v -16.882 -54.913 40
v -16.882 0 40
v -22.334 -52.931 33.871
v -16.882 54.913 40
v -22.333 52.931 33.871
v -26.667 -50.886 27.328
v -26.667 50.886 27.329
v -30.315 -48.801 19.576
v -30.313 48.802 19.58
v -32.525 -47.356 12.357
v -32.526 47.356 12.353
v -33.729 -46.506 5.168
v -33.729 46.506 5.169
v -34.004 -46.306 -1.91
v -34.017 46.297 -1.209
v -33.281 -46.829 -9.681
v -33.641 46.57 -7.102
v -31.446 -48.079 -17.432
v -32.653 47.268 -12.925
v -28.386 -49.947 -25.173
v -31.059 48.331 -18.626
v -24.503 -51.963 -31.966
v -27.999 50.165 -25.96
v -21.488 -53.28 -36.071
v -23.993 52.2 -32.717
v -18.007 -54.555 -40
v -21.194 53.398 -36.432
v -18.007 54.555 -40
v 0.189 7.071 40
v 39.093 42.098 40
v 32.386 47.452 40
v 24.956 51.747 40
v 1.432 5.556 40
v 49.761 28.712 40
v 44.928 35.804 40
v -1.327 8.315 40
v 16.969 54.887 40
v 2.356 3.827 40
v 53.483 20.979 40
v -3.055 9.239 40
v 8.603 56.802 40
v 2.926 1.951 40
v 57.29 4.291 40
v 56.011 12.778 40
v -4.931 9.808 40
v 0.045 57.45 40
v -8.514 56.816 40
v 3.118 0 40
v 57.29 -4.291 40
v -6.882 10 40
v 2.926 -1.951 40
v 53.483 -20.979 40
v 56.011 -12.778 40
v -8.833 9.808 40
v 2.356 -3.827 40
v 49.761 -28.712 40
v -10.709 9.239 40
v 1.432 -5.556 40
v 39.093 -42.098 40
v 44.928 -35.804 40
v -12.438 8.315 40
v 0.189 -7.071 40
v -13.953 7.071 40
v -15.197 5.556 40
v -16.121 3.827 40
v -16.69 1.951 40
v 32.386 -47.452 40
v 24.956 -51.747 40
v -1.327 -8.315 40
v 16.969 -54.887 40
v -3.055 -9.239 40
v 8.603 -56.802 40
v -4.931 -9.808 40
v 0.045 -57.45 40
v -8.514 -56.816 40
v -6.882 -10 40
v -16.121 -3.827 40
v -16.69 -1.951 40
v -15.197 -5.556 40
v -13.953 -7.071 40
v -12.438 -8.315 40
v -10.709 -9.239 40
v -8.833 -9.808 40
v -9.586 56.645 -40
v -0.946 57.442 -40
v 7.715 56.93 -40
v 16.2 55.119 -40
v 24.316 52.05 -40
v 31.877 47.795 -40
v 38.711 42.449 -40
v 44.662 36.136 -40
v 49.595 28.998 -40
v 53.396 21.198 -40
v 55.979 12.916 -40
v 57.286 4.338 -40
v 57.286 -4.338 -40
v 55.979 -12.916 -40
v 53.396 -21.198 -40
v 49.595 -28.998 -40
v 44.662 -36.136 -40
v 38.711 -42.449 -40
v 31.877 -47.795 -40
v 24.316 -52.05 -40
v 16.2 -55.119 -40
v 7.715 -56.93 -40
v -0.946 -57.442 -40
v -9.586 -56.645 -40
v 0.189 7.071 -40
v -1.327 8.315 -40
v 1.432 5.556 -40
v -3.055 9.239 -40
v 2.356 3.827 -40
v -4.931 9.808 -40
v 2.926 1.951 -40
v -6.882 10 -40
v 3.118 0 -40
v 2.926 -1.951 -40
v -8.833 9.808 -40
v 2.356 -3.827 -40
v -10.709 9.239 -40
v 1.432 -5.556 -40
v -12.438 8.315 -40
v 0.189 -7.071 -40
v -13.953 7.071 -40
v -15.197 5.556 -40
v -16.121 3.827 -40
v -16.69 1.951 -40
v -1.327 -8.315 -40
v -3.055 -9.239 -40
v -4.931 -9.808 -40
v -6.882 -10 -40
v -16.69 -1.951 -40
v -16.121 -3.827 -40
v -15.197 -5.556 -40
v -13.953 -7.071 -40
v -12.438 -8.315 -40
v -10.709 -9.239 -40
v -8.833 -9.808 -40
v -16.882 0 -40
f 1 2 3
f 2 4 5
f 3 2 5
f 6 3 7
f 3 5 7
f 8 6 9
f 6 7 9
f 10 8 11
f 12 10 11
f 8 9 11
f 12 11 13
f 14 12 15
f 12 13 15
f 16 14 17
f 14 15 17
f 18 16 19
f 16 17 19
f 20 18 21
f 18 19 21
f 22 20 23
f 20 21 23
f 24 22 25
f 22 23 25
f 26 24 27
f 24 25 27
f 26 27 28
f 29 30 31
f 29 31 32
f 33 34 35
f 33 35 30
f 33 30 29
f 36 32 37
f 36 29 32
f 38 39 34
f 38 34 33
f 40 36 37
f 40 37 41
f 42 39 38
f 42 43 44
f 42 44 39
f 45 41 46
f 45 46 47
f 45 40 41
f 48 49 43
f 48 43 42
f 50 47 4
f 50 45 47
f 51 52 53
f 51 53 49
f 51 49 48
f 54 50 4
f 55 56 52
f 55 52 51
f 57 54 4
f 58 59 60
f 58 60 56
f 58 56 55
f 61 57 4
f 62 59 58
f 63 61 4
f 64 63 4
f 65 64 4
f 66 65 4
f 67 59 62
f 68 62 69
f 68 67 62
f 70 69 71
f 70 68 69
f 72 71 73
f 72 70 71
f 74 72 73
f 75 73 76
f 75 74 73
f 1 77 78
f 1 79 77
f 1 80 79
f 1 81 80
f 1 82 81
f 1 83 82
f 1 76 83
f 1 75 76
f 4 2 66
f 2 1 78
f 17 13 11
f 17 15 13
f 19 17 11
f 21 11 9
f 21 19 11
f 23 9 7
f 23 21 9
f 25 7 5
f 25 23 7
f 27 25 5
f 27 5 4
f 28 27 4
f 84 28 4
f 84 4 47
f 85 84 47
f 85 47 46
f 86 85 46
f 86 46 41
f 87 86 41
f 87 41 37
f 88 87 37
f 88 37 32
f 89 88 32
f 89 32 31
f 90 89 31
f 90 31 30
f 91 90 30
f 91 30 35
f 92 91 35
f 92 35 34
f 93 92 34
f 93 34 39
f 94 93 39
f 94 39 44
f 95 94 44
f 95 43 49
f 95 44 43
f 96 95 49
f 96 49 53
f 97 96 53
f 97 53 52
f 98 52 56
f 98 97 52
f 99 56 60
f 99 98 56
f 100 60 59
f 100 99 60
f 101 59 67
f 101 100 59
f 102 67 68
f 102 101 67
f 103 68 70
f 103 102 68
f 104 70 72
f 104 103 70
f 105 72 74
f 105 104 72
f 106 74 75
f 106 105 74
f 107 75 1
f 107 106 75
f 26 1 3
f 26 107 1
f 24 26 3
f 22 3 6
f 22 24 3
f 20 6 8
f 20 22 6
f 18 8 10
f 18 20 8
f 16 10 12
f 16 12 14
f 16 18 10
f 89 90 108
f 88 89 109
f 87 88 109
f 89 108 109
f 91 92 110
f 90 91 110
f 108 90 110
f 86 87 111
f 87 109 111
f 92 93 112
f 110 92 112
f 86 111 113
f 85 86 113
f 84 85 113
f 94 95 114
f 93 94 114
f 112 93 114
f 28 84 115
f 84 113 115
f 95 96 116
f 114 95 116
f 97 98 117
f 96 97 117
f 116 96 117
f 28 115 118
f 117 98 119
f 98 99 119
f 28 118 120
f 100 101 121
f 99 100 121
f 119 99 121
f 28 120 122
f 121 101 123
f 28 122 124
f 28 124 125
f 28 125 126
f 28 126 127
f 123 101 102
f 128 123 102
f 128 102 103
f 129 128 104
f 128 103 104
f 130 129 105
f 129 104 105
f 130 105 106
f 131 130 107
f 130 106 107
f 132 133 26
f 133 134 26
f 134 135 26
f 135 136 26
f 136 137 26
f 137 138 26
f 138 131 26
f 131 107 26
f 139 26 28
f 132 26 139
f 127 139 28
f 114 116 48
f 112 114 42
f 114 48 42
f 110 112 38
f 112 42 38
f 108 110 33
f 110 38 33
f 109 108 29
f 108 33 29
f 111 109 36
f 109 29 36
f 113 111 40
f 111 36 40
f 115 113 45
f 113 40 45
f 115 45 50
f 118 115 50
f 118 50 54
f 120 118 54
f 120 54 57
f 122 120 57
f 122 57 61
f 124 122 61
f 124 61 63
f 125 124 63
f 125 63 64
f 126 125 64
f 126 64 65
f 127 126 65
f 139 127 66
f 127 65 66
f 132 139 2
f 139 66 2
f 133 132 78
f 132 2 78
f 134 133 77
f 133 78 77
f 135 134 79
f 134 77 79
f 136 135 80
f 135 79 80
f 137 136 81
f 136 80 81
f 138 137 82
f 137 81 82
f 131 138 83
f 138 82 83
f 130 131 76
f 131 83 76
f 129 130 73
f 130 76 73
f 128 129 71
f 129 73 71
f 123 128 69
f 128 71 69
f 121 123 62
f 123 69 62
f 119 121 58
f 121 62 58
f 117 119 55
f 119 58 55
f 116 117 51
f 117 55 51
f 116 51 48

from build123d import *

# Parameters (mm, degrees)
SKETCH1_W               = 57.45
SKETCH1_H               = 80
CUT_EXTRUDE1_DEPTH      = 58.45
CUT_EXTRUDE1_DEPTH_BACK = 58.45
SKETCH3_R               = 10
CUT_EXTRUDE3_DEPTH      = 81.0000001


with BuildPart() as part:
    # Sketch1 → Revolve2 (revolve)
    with BuildSketch(Plane(origin=(0, 0, 0), x_dir=(1, 0, 0), z_dir=(0, 1, 0))):
        with Locations((28.725, 0)):
            Rectangle(SKETCH1_W, SKETCH1_H)
    revolve(axis=Axis((0, 0, 40), (0, 0, -1)))

    # Sketch2 → Cut-Extrude1 (cut, two sides)
    with BuildSketch(Plane(origin=(0, 0, 0), x_dir=(1, 0, 0), z_dir=(0, 1, 0))) as cut_extrude1_sk:
        with BuildLine():
            Line((-18.006693033, 40), (-57.45, 40))
            Line((-57.45, 40), (-57.45, -40))
            Line((-57.45, -40), (-16.882331675, -40))
            ThreePointArc((-16.882331675, -40), (-34.014765262, -0.232886901), (-18.006693033, 40))
        make_face()
    extrude(amount=CUT_EXTRUDE1_DEPTH, mode=Mode.SUBTRACT)
    extrude(cut_extrude1_sk.sketch, amount=-CUT_EXTRUDE1_DEPTH_BACK, mode=Mode.SUBTRACT)

    # Sketch3 → Cut-Extrude3 (cut, through all)
    with BuildSketch(Plane.XY.offset(40)):
        with Locations((-6.882331675, 0)):
            Circle(SKETCH3_R)
    extrude(amount=-CUT_EXTRUDE3_DEPTH, mode=Mode.SUBTRACT)


solid = part.part
